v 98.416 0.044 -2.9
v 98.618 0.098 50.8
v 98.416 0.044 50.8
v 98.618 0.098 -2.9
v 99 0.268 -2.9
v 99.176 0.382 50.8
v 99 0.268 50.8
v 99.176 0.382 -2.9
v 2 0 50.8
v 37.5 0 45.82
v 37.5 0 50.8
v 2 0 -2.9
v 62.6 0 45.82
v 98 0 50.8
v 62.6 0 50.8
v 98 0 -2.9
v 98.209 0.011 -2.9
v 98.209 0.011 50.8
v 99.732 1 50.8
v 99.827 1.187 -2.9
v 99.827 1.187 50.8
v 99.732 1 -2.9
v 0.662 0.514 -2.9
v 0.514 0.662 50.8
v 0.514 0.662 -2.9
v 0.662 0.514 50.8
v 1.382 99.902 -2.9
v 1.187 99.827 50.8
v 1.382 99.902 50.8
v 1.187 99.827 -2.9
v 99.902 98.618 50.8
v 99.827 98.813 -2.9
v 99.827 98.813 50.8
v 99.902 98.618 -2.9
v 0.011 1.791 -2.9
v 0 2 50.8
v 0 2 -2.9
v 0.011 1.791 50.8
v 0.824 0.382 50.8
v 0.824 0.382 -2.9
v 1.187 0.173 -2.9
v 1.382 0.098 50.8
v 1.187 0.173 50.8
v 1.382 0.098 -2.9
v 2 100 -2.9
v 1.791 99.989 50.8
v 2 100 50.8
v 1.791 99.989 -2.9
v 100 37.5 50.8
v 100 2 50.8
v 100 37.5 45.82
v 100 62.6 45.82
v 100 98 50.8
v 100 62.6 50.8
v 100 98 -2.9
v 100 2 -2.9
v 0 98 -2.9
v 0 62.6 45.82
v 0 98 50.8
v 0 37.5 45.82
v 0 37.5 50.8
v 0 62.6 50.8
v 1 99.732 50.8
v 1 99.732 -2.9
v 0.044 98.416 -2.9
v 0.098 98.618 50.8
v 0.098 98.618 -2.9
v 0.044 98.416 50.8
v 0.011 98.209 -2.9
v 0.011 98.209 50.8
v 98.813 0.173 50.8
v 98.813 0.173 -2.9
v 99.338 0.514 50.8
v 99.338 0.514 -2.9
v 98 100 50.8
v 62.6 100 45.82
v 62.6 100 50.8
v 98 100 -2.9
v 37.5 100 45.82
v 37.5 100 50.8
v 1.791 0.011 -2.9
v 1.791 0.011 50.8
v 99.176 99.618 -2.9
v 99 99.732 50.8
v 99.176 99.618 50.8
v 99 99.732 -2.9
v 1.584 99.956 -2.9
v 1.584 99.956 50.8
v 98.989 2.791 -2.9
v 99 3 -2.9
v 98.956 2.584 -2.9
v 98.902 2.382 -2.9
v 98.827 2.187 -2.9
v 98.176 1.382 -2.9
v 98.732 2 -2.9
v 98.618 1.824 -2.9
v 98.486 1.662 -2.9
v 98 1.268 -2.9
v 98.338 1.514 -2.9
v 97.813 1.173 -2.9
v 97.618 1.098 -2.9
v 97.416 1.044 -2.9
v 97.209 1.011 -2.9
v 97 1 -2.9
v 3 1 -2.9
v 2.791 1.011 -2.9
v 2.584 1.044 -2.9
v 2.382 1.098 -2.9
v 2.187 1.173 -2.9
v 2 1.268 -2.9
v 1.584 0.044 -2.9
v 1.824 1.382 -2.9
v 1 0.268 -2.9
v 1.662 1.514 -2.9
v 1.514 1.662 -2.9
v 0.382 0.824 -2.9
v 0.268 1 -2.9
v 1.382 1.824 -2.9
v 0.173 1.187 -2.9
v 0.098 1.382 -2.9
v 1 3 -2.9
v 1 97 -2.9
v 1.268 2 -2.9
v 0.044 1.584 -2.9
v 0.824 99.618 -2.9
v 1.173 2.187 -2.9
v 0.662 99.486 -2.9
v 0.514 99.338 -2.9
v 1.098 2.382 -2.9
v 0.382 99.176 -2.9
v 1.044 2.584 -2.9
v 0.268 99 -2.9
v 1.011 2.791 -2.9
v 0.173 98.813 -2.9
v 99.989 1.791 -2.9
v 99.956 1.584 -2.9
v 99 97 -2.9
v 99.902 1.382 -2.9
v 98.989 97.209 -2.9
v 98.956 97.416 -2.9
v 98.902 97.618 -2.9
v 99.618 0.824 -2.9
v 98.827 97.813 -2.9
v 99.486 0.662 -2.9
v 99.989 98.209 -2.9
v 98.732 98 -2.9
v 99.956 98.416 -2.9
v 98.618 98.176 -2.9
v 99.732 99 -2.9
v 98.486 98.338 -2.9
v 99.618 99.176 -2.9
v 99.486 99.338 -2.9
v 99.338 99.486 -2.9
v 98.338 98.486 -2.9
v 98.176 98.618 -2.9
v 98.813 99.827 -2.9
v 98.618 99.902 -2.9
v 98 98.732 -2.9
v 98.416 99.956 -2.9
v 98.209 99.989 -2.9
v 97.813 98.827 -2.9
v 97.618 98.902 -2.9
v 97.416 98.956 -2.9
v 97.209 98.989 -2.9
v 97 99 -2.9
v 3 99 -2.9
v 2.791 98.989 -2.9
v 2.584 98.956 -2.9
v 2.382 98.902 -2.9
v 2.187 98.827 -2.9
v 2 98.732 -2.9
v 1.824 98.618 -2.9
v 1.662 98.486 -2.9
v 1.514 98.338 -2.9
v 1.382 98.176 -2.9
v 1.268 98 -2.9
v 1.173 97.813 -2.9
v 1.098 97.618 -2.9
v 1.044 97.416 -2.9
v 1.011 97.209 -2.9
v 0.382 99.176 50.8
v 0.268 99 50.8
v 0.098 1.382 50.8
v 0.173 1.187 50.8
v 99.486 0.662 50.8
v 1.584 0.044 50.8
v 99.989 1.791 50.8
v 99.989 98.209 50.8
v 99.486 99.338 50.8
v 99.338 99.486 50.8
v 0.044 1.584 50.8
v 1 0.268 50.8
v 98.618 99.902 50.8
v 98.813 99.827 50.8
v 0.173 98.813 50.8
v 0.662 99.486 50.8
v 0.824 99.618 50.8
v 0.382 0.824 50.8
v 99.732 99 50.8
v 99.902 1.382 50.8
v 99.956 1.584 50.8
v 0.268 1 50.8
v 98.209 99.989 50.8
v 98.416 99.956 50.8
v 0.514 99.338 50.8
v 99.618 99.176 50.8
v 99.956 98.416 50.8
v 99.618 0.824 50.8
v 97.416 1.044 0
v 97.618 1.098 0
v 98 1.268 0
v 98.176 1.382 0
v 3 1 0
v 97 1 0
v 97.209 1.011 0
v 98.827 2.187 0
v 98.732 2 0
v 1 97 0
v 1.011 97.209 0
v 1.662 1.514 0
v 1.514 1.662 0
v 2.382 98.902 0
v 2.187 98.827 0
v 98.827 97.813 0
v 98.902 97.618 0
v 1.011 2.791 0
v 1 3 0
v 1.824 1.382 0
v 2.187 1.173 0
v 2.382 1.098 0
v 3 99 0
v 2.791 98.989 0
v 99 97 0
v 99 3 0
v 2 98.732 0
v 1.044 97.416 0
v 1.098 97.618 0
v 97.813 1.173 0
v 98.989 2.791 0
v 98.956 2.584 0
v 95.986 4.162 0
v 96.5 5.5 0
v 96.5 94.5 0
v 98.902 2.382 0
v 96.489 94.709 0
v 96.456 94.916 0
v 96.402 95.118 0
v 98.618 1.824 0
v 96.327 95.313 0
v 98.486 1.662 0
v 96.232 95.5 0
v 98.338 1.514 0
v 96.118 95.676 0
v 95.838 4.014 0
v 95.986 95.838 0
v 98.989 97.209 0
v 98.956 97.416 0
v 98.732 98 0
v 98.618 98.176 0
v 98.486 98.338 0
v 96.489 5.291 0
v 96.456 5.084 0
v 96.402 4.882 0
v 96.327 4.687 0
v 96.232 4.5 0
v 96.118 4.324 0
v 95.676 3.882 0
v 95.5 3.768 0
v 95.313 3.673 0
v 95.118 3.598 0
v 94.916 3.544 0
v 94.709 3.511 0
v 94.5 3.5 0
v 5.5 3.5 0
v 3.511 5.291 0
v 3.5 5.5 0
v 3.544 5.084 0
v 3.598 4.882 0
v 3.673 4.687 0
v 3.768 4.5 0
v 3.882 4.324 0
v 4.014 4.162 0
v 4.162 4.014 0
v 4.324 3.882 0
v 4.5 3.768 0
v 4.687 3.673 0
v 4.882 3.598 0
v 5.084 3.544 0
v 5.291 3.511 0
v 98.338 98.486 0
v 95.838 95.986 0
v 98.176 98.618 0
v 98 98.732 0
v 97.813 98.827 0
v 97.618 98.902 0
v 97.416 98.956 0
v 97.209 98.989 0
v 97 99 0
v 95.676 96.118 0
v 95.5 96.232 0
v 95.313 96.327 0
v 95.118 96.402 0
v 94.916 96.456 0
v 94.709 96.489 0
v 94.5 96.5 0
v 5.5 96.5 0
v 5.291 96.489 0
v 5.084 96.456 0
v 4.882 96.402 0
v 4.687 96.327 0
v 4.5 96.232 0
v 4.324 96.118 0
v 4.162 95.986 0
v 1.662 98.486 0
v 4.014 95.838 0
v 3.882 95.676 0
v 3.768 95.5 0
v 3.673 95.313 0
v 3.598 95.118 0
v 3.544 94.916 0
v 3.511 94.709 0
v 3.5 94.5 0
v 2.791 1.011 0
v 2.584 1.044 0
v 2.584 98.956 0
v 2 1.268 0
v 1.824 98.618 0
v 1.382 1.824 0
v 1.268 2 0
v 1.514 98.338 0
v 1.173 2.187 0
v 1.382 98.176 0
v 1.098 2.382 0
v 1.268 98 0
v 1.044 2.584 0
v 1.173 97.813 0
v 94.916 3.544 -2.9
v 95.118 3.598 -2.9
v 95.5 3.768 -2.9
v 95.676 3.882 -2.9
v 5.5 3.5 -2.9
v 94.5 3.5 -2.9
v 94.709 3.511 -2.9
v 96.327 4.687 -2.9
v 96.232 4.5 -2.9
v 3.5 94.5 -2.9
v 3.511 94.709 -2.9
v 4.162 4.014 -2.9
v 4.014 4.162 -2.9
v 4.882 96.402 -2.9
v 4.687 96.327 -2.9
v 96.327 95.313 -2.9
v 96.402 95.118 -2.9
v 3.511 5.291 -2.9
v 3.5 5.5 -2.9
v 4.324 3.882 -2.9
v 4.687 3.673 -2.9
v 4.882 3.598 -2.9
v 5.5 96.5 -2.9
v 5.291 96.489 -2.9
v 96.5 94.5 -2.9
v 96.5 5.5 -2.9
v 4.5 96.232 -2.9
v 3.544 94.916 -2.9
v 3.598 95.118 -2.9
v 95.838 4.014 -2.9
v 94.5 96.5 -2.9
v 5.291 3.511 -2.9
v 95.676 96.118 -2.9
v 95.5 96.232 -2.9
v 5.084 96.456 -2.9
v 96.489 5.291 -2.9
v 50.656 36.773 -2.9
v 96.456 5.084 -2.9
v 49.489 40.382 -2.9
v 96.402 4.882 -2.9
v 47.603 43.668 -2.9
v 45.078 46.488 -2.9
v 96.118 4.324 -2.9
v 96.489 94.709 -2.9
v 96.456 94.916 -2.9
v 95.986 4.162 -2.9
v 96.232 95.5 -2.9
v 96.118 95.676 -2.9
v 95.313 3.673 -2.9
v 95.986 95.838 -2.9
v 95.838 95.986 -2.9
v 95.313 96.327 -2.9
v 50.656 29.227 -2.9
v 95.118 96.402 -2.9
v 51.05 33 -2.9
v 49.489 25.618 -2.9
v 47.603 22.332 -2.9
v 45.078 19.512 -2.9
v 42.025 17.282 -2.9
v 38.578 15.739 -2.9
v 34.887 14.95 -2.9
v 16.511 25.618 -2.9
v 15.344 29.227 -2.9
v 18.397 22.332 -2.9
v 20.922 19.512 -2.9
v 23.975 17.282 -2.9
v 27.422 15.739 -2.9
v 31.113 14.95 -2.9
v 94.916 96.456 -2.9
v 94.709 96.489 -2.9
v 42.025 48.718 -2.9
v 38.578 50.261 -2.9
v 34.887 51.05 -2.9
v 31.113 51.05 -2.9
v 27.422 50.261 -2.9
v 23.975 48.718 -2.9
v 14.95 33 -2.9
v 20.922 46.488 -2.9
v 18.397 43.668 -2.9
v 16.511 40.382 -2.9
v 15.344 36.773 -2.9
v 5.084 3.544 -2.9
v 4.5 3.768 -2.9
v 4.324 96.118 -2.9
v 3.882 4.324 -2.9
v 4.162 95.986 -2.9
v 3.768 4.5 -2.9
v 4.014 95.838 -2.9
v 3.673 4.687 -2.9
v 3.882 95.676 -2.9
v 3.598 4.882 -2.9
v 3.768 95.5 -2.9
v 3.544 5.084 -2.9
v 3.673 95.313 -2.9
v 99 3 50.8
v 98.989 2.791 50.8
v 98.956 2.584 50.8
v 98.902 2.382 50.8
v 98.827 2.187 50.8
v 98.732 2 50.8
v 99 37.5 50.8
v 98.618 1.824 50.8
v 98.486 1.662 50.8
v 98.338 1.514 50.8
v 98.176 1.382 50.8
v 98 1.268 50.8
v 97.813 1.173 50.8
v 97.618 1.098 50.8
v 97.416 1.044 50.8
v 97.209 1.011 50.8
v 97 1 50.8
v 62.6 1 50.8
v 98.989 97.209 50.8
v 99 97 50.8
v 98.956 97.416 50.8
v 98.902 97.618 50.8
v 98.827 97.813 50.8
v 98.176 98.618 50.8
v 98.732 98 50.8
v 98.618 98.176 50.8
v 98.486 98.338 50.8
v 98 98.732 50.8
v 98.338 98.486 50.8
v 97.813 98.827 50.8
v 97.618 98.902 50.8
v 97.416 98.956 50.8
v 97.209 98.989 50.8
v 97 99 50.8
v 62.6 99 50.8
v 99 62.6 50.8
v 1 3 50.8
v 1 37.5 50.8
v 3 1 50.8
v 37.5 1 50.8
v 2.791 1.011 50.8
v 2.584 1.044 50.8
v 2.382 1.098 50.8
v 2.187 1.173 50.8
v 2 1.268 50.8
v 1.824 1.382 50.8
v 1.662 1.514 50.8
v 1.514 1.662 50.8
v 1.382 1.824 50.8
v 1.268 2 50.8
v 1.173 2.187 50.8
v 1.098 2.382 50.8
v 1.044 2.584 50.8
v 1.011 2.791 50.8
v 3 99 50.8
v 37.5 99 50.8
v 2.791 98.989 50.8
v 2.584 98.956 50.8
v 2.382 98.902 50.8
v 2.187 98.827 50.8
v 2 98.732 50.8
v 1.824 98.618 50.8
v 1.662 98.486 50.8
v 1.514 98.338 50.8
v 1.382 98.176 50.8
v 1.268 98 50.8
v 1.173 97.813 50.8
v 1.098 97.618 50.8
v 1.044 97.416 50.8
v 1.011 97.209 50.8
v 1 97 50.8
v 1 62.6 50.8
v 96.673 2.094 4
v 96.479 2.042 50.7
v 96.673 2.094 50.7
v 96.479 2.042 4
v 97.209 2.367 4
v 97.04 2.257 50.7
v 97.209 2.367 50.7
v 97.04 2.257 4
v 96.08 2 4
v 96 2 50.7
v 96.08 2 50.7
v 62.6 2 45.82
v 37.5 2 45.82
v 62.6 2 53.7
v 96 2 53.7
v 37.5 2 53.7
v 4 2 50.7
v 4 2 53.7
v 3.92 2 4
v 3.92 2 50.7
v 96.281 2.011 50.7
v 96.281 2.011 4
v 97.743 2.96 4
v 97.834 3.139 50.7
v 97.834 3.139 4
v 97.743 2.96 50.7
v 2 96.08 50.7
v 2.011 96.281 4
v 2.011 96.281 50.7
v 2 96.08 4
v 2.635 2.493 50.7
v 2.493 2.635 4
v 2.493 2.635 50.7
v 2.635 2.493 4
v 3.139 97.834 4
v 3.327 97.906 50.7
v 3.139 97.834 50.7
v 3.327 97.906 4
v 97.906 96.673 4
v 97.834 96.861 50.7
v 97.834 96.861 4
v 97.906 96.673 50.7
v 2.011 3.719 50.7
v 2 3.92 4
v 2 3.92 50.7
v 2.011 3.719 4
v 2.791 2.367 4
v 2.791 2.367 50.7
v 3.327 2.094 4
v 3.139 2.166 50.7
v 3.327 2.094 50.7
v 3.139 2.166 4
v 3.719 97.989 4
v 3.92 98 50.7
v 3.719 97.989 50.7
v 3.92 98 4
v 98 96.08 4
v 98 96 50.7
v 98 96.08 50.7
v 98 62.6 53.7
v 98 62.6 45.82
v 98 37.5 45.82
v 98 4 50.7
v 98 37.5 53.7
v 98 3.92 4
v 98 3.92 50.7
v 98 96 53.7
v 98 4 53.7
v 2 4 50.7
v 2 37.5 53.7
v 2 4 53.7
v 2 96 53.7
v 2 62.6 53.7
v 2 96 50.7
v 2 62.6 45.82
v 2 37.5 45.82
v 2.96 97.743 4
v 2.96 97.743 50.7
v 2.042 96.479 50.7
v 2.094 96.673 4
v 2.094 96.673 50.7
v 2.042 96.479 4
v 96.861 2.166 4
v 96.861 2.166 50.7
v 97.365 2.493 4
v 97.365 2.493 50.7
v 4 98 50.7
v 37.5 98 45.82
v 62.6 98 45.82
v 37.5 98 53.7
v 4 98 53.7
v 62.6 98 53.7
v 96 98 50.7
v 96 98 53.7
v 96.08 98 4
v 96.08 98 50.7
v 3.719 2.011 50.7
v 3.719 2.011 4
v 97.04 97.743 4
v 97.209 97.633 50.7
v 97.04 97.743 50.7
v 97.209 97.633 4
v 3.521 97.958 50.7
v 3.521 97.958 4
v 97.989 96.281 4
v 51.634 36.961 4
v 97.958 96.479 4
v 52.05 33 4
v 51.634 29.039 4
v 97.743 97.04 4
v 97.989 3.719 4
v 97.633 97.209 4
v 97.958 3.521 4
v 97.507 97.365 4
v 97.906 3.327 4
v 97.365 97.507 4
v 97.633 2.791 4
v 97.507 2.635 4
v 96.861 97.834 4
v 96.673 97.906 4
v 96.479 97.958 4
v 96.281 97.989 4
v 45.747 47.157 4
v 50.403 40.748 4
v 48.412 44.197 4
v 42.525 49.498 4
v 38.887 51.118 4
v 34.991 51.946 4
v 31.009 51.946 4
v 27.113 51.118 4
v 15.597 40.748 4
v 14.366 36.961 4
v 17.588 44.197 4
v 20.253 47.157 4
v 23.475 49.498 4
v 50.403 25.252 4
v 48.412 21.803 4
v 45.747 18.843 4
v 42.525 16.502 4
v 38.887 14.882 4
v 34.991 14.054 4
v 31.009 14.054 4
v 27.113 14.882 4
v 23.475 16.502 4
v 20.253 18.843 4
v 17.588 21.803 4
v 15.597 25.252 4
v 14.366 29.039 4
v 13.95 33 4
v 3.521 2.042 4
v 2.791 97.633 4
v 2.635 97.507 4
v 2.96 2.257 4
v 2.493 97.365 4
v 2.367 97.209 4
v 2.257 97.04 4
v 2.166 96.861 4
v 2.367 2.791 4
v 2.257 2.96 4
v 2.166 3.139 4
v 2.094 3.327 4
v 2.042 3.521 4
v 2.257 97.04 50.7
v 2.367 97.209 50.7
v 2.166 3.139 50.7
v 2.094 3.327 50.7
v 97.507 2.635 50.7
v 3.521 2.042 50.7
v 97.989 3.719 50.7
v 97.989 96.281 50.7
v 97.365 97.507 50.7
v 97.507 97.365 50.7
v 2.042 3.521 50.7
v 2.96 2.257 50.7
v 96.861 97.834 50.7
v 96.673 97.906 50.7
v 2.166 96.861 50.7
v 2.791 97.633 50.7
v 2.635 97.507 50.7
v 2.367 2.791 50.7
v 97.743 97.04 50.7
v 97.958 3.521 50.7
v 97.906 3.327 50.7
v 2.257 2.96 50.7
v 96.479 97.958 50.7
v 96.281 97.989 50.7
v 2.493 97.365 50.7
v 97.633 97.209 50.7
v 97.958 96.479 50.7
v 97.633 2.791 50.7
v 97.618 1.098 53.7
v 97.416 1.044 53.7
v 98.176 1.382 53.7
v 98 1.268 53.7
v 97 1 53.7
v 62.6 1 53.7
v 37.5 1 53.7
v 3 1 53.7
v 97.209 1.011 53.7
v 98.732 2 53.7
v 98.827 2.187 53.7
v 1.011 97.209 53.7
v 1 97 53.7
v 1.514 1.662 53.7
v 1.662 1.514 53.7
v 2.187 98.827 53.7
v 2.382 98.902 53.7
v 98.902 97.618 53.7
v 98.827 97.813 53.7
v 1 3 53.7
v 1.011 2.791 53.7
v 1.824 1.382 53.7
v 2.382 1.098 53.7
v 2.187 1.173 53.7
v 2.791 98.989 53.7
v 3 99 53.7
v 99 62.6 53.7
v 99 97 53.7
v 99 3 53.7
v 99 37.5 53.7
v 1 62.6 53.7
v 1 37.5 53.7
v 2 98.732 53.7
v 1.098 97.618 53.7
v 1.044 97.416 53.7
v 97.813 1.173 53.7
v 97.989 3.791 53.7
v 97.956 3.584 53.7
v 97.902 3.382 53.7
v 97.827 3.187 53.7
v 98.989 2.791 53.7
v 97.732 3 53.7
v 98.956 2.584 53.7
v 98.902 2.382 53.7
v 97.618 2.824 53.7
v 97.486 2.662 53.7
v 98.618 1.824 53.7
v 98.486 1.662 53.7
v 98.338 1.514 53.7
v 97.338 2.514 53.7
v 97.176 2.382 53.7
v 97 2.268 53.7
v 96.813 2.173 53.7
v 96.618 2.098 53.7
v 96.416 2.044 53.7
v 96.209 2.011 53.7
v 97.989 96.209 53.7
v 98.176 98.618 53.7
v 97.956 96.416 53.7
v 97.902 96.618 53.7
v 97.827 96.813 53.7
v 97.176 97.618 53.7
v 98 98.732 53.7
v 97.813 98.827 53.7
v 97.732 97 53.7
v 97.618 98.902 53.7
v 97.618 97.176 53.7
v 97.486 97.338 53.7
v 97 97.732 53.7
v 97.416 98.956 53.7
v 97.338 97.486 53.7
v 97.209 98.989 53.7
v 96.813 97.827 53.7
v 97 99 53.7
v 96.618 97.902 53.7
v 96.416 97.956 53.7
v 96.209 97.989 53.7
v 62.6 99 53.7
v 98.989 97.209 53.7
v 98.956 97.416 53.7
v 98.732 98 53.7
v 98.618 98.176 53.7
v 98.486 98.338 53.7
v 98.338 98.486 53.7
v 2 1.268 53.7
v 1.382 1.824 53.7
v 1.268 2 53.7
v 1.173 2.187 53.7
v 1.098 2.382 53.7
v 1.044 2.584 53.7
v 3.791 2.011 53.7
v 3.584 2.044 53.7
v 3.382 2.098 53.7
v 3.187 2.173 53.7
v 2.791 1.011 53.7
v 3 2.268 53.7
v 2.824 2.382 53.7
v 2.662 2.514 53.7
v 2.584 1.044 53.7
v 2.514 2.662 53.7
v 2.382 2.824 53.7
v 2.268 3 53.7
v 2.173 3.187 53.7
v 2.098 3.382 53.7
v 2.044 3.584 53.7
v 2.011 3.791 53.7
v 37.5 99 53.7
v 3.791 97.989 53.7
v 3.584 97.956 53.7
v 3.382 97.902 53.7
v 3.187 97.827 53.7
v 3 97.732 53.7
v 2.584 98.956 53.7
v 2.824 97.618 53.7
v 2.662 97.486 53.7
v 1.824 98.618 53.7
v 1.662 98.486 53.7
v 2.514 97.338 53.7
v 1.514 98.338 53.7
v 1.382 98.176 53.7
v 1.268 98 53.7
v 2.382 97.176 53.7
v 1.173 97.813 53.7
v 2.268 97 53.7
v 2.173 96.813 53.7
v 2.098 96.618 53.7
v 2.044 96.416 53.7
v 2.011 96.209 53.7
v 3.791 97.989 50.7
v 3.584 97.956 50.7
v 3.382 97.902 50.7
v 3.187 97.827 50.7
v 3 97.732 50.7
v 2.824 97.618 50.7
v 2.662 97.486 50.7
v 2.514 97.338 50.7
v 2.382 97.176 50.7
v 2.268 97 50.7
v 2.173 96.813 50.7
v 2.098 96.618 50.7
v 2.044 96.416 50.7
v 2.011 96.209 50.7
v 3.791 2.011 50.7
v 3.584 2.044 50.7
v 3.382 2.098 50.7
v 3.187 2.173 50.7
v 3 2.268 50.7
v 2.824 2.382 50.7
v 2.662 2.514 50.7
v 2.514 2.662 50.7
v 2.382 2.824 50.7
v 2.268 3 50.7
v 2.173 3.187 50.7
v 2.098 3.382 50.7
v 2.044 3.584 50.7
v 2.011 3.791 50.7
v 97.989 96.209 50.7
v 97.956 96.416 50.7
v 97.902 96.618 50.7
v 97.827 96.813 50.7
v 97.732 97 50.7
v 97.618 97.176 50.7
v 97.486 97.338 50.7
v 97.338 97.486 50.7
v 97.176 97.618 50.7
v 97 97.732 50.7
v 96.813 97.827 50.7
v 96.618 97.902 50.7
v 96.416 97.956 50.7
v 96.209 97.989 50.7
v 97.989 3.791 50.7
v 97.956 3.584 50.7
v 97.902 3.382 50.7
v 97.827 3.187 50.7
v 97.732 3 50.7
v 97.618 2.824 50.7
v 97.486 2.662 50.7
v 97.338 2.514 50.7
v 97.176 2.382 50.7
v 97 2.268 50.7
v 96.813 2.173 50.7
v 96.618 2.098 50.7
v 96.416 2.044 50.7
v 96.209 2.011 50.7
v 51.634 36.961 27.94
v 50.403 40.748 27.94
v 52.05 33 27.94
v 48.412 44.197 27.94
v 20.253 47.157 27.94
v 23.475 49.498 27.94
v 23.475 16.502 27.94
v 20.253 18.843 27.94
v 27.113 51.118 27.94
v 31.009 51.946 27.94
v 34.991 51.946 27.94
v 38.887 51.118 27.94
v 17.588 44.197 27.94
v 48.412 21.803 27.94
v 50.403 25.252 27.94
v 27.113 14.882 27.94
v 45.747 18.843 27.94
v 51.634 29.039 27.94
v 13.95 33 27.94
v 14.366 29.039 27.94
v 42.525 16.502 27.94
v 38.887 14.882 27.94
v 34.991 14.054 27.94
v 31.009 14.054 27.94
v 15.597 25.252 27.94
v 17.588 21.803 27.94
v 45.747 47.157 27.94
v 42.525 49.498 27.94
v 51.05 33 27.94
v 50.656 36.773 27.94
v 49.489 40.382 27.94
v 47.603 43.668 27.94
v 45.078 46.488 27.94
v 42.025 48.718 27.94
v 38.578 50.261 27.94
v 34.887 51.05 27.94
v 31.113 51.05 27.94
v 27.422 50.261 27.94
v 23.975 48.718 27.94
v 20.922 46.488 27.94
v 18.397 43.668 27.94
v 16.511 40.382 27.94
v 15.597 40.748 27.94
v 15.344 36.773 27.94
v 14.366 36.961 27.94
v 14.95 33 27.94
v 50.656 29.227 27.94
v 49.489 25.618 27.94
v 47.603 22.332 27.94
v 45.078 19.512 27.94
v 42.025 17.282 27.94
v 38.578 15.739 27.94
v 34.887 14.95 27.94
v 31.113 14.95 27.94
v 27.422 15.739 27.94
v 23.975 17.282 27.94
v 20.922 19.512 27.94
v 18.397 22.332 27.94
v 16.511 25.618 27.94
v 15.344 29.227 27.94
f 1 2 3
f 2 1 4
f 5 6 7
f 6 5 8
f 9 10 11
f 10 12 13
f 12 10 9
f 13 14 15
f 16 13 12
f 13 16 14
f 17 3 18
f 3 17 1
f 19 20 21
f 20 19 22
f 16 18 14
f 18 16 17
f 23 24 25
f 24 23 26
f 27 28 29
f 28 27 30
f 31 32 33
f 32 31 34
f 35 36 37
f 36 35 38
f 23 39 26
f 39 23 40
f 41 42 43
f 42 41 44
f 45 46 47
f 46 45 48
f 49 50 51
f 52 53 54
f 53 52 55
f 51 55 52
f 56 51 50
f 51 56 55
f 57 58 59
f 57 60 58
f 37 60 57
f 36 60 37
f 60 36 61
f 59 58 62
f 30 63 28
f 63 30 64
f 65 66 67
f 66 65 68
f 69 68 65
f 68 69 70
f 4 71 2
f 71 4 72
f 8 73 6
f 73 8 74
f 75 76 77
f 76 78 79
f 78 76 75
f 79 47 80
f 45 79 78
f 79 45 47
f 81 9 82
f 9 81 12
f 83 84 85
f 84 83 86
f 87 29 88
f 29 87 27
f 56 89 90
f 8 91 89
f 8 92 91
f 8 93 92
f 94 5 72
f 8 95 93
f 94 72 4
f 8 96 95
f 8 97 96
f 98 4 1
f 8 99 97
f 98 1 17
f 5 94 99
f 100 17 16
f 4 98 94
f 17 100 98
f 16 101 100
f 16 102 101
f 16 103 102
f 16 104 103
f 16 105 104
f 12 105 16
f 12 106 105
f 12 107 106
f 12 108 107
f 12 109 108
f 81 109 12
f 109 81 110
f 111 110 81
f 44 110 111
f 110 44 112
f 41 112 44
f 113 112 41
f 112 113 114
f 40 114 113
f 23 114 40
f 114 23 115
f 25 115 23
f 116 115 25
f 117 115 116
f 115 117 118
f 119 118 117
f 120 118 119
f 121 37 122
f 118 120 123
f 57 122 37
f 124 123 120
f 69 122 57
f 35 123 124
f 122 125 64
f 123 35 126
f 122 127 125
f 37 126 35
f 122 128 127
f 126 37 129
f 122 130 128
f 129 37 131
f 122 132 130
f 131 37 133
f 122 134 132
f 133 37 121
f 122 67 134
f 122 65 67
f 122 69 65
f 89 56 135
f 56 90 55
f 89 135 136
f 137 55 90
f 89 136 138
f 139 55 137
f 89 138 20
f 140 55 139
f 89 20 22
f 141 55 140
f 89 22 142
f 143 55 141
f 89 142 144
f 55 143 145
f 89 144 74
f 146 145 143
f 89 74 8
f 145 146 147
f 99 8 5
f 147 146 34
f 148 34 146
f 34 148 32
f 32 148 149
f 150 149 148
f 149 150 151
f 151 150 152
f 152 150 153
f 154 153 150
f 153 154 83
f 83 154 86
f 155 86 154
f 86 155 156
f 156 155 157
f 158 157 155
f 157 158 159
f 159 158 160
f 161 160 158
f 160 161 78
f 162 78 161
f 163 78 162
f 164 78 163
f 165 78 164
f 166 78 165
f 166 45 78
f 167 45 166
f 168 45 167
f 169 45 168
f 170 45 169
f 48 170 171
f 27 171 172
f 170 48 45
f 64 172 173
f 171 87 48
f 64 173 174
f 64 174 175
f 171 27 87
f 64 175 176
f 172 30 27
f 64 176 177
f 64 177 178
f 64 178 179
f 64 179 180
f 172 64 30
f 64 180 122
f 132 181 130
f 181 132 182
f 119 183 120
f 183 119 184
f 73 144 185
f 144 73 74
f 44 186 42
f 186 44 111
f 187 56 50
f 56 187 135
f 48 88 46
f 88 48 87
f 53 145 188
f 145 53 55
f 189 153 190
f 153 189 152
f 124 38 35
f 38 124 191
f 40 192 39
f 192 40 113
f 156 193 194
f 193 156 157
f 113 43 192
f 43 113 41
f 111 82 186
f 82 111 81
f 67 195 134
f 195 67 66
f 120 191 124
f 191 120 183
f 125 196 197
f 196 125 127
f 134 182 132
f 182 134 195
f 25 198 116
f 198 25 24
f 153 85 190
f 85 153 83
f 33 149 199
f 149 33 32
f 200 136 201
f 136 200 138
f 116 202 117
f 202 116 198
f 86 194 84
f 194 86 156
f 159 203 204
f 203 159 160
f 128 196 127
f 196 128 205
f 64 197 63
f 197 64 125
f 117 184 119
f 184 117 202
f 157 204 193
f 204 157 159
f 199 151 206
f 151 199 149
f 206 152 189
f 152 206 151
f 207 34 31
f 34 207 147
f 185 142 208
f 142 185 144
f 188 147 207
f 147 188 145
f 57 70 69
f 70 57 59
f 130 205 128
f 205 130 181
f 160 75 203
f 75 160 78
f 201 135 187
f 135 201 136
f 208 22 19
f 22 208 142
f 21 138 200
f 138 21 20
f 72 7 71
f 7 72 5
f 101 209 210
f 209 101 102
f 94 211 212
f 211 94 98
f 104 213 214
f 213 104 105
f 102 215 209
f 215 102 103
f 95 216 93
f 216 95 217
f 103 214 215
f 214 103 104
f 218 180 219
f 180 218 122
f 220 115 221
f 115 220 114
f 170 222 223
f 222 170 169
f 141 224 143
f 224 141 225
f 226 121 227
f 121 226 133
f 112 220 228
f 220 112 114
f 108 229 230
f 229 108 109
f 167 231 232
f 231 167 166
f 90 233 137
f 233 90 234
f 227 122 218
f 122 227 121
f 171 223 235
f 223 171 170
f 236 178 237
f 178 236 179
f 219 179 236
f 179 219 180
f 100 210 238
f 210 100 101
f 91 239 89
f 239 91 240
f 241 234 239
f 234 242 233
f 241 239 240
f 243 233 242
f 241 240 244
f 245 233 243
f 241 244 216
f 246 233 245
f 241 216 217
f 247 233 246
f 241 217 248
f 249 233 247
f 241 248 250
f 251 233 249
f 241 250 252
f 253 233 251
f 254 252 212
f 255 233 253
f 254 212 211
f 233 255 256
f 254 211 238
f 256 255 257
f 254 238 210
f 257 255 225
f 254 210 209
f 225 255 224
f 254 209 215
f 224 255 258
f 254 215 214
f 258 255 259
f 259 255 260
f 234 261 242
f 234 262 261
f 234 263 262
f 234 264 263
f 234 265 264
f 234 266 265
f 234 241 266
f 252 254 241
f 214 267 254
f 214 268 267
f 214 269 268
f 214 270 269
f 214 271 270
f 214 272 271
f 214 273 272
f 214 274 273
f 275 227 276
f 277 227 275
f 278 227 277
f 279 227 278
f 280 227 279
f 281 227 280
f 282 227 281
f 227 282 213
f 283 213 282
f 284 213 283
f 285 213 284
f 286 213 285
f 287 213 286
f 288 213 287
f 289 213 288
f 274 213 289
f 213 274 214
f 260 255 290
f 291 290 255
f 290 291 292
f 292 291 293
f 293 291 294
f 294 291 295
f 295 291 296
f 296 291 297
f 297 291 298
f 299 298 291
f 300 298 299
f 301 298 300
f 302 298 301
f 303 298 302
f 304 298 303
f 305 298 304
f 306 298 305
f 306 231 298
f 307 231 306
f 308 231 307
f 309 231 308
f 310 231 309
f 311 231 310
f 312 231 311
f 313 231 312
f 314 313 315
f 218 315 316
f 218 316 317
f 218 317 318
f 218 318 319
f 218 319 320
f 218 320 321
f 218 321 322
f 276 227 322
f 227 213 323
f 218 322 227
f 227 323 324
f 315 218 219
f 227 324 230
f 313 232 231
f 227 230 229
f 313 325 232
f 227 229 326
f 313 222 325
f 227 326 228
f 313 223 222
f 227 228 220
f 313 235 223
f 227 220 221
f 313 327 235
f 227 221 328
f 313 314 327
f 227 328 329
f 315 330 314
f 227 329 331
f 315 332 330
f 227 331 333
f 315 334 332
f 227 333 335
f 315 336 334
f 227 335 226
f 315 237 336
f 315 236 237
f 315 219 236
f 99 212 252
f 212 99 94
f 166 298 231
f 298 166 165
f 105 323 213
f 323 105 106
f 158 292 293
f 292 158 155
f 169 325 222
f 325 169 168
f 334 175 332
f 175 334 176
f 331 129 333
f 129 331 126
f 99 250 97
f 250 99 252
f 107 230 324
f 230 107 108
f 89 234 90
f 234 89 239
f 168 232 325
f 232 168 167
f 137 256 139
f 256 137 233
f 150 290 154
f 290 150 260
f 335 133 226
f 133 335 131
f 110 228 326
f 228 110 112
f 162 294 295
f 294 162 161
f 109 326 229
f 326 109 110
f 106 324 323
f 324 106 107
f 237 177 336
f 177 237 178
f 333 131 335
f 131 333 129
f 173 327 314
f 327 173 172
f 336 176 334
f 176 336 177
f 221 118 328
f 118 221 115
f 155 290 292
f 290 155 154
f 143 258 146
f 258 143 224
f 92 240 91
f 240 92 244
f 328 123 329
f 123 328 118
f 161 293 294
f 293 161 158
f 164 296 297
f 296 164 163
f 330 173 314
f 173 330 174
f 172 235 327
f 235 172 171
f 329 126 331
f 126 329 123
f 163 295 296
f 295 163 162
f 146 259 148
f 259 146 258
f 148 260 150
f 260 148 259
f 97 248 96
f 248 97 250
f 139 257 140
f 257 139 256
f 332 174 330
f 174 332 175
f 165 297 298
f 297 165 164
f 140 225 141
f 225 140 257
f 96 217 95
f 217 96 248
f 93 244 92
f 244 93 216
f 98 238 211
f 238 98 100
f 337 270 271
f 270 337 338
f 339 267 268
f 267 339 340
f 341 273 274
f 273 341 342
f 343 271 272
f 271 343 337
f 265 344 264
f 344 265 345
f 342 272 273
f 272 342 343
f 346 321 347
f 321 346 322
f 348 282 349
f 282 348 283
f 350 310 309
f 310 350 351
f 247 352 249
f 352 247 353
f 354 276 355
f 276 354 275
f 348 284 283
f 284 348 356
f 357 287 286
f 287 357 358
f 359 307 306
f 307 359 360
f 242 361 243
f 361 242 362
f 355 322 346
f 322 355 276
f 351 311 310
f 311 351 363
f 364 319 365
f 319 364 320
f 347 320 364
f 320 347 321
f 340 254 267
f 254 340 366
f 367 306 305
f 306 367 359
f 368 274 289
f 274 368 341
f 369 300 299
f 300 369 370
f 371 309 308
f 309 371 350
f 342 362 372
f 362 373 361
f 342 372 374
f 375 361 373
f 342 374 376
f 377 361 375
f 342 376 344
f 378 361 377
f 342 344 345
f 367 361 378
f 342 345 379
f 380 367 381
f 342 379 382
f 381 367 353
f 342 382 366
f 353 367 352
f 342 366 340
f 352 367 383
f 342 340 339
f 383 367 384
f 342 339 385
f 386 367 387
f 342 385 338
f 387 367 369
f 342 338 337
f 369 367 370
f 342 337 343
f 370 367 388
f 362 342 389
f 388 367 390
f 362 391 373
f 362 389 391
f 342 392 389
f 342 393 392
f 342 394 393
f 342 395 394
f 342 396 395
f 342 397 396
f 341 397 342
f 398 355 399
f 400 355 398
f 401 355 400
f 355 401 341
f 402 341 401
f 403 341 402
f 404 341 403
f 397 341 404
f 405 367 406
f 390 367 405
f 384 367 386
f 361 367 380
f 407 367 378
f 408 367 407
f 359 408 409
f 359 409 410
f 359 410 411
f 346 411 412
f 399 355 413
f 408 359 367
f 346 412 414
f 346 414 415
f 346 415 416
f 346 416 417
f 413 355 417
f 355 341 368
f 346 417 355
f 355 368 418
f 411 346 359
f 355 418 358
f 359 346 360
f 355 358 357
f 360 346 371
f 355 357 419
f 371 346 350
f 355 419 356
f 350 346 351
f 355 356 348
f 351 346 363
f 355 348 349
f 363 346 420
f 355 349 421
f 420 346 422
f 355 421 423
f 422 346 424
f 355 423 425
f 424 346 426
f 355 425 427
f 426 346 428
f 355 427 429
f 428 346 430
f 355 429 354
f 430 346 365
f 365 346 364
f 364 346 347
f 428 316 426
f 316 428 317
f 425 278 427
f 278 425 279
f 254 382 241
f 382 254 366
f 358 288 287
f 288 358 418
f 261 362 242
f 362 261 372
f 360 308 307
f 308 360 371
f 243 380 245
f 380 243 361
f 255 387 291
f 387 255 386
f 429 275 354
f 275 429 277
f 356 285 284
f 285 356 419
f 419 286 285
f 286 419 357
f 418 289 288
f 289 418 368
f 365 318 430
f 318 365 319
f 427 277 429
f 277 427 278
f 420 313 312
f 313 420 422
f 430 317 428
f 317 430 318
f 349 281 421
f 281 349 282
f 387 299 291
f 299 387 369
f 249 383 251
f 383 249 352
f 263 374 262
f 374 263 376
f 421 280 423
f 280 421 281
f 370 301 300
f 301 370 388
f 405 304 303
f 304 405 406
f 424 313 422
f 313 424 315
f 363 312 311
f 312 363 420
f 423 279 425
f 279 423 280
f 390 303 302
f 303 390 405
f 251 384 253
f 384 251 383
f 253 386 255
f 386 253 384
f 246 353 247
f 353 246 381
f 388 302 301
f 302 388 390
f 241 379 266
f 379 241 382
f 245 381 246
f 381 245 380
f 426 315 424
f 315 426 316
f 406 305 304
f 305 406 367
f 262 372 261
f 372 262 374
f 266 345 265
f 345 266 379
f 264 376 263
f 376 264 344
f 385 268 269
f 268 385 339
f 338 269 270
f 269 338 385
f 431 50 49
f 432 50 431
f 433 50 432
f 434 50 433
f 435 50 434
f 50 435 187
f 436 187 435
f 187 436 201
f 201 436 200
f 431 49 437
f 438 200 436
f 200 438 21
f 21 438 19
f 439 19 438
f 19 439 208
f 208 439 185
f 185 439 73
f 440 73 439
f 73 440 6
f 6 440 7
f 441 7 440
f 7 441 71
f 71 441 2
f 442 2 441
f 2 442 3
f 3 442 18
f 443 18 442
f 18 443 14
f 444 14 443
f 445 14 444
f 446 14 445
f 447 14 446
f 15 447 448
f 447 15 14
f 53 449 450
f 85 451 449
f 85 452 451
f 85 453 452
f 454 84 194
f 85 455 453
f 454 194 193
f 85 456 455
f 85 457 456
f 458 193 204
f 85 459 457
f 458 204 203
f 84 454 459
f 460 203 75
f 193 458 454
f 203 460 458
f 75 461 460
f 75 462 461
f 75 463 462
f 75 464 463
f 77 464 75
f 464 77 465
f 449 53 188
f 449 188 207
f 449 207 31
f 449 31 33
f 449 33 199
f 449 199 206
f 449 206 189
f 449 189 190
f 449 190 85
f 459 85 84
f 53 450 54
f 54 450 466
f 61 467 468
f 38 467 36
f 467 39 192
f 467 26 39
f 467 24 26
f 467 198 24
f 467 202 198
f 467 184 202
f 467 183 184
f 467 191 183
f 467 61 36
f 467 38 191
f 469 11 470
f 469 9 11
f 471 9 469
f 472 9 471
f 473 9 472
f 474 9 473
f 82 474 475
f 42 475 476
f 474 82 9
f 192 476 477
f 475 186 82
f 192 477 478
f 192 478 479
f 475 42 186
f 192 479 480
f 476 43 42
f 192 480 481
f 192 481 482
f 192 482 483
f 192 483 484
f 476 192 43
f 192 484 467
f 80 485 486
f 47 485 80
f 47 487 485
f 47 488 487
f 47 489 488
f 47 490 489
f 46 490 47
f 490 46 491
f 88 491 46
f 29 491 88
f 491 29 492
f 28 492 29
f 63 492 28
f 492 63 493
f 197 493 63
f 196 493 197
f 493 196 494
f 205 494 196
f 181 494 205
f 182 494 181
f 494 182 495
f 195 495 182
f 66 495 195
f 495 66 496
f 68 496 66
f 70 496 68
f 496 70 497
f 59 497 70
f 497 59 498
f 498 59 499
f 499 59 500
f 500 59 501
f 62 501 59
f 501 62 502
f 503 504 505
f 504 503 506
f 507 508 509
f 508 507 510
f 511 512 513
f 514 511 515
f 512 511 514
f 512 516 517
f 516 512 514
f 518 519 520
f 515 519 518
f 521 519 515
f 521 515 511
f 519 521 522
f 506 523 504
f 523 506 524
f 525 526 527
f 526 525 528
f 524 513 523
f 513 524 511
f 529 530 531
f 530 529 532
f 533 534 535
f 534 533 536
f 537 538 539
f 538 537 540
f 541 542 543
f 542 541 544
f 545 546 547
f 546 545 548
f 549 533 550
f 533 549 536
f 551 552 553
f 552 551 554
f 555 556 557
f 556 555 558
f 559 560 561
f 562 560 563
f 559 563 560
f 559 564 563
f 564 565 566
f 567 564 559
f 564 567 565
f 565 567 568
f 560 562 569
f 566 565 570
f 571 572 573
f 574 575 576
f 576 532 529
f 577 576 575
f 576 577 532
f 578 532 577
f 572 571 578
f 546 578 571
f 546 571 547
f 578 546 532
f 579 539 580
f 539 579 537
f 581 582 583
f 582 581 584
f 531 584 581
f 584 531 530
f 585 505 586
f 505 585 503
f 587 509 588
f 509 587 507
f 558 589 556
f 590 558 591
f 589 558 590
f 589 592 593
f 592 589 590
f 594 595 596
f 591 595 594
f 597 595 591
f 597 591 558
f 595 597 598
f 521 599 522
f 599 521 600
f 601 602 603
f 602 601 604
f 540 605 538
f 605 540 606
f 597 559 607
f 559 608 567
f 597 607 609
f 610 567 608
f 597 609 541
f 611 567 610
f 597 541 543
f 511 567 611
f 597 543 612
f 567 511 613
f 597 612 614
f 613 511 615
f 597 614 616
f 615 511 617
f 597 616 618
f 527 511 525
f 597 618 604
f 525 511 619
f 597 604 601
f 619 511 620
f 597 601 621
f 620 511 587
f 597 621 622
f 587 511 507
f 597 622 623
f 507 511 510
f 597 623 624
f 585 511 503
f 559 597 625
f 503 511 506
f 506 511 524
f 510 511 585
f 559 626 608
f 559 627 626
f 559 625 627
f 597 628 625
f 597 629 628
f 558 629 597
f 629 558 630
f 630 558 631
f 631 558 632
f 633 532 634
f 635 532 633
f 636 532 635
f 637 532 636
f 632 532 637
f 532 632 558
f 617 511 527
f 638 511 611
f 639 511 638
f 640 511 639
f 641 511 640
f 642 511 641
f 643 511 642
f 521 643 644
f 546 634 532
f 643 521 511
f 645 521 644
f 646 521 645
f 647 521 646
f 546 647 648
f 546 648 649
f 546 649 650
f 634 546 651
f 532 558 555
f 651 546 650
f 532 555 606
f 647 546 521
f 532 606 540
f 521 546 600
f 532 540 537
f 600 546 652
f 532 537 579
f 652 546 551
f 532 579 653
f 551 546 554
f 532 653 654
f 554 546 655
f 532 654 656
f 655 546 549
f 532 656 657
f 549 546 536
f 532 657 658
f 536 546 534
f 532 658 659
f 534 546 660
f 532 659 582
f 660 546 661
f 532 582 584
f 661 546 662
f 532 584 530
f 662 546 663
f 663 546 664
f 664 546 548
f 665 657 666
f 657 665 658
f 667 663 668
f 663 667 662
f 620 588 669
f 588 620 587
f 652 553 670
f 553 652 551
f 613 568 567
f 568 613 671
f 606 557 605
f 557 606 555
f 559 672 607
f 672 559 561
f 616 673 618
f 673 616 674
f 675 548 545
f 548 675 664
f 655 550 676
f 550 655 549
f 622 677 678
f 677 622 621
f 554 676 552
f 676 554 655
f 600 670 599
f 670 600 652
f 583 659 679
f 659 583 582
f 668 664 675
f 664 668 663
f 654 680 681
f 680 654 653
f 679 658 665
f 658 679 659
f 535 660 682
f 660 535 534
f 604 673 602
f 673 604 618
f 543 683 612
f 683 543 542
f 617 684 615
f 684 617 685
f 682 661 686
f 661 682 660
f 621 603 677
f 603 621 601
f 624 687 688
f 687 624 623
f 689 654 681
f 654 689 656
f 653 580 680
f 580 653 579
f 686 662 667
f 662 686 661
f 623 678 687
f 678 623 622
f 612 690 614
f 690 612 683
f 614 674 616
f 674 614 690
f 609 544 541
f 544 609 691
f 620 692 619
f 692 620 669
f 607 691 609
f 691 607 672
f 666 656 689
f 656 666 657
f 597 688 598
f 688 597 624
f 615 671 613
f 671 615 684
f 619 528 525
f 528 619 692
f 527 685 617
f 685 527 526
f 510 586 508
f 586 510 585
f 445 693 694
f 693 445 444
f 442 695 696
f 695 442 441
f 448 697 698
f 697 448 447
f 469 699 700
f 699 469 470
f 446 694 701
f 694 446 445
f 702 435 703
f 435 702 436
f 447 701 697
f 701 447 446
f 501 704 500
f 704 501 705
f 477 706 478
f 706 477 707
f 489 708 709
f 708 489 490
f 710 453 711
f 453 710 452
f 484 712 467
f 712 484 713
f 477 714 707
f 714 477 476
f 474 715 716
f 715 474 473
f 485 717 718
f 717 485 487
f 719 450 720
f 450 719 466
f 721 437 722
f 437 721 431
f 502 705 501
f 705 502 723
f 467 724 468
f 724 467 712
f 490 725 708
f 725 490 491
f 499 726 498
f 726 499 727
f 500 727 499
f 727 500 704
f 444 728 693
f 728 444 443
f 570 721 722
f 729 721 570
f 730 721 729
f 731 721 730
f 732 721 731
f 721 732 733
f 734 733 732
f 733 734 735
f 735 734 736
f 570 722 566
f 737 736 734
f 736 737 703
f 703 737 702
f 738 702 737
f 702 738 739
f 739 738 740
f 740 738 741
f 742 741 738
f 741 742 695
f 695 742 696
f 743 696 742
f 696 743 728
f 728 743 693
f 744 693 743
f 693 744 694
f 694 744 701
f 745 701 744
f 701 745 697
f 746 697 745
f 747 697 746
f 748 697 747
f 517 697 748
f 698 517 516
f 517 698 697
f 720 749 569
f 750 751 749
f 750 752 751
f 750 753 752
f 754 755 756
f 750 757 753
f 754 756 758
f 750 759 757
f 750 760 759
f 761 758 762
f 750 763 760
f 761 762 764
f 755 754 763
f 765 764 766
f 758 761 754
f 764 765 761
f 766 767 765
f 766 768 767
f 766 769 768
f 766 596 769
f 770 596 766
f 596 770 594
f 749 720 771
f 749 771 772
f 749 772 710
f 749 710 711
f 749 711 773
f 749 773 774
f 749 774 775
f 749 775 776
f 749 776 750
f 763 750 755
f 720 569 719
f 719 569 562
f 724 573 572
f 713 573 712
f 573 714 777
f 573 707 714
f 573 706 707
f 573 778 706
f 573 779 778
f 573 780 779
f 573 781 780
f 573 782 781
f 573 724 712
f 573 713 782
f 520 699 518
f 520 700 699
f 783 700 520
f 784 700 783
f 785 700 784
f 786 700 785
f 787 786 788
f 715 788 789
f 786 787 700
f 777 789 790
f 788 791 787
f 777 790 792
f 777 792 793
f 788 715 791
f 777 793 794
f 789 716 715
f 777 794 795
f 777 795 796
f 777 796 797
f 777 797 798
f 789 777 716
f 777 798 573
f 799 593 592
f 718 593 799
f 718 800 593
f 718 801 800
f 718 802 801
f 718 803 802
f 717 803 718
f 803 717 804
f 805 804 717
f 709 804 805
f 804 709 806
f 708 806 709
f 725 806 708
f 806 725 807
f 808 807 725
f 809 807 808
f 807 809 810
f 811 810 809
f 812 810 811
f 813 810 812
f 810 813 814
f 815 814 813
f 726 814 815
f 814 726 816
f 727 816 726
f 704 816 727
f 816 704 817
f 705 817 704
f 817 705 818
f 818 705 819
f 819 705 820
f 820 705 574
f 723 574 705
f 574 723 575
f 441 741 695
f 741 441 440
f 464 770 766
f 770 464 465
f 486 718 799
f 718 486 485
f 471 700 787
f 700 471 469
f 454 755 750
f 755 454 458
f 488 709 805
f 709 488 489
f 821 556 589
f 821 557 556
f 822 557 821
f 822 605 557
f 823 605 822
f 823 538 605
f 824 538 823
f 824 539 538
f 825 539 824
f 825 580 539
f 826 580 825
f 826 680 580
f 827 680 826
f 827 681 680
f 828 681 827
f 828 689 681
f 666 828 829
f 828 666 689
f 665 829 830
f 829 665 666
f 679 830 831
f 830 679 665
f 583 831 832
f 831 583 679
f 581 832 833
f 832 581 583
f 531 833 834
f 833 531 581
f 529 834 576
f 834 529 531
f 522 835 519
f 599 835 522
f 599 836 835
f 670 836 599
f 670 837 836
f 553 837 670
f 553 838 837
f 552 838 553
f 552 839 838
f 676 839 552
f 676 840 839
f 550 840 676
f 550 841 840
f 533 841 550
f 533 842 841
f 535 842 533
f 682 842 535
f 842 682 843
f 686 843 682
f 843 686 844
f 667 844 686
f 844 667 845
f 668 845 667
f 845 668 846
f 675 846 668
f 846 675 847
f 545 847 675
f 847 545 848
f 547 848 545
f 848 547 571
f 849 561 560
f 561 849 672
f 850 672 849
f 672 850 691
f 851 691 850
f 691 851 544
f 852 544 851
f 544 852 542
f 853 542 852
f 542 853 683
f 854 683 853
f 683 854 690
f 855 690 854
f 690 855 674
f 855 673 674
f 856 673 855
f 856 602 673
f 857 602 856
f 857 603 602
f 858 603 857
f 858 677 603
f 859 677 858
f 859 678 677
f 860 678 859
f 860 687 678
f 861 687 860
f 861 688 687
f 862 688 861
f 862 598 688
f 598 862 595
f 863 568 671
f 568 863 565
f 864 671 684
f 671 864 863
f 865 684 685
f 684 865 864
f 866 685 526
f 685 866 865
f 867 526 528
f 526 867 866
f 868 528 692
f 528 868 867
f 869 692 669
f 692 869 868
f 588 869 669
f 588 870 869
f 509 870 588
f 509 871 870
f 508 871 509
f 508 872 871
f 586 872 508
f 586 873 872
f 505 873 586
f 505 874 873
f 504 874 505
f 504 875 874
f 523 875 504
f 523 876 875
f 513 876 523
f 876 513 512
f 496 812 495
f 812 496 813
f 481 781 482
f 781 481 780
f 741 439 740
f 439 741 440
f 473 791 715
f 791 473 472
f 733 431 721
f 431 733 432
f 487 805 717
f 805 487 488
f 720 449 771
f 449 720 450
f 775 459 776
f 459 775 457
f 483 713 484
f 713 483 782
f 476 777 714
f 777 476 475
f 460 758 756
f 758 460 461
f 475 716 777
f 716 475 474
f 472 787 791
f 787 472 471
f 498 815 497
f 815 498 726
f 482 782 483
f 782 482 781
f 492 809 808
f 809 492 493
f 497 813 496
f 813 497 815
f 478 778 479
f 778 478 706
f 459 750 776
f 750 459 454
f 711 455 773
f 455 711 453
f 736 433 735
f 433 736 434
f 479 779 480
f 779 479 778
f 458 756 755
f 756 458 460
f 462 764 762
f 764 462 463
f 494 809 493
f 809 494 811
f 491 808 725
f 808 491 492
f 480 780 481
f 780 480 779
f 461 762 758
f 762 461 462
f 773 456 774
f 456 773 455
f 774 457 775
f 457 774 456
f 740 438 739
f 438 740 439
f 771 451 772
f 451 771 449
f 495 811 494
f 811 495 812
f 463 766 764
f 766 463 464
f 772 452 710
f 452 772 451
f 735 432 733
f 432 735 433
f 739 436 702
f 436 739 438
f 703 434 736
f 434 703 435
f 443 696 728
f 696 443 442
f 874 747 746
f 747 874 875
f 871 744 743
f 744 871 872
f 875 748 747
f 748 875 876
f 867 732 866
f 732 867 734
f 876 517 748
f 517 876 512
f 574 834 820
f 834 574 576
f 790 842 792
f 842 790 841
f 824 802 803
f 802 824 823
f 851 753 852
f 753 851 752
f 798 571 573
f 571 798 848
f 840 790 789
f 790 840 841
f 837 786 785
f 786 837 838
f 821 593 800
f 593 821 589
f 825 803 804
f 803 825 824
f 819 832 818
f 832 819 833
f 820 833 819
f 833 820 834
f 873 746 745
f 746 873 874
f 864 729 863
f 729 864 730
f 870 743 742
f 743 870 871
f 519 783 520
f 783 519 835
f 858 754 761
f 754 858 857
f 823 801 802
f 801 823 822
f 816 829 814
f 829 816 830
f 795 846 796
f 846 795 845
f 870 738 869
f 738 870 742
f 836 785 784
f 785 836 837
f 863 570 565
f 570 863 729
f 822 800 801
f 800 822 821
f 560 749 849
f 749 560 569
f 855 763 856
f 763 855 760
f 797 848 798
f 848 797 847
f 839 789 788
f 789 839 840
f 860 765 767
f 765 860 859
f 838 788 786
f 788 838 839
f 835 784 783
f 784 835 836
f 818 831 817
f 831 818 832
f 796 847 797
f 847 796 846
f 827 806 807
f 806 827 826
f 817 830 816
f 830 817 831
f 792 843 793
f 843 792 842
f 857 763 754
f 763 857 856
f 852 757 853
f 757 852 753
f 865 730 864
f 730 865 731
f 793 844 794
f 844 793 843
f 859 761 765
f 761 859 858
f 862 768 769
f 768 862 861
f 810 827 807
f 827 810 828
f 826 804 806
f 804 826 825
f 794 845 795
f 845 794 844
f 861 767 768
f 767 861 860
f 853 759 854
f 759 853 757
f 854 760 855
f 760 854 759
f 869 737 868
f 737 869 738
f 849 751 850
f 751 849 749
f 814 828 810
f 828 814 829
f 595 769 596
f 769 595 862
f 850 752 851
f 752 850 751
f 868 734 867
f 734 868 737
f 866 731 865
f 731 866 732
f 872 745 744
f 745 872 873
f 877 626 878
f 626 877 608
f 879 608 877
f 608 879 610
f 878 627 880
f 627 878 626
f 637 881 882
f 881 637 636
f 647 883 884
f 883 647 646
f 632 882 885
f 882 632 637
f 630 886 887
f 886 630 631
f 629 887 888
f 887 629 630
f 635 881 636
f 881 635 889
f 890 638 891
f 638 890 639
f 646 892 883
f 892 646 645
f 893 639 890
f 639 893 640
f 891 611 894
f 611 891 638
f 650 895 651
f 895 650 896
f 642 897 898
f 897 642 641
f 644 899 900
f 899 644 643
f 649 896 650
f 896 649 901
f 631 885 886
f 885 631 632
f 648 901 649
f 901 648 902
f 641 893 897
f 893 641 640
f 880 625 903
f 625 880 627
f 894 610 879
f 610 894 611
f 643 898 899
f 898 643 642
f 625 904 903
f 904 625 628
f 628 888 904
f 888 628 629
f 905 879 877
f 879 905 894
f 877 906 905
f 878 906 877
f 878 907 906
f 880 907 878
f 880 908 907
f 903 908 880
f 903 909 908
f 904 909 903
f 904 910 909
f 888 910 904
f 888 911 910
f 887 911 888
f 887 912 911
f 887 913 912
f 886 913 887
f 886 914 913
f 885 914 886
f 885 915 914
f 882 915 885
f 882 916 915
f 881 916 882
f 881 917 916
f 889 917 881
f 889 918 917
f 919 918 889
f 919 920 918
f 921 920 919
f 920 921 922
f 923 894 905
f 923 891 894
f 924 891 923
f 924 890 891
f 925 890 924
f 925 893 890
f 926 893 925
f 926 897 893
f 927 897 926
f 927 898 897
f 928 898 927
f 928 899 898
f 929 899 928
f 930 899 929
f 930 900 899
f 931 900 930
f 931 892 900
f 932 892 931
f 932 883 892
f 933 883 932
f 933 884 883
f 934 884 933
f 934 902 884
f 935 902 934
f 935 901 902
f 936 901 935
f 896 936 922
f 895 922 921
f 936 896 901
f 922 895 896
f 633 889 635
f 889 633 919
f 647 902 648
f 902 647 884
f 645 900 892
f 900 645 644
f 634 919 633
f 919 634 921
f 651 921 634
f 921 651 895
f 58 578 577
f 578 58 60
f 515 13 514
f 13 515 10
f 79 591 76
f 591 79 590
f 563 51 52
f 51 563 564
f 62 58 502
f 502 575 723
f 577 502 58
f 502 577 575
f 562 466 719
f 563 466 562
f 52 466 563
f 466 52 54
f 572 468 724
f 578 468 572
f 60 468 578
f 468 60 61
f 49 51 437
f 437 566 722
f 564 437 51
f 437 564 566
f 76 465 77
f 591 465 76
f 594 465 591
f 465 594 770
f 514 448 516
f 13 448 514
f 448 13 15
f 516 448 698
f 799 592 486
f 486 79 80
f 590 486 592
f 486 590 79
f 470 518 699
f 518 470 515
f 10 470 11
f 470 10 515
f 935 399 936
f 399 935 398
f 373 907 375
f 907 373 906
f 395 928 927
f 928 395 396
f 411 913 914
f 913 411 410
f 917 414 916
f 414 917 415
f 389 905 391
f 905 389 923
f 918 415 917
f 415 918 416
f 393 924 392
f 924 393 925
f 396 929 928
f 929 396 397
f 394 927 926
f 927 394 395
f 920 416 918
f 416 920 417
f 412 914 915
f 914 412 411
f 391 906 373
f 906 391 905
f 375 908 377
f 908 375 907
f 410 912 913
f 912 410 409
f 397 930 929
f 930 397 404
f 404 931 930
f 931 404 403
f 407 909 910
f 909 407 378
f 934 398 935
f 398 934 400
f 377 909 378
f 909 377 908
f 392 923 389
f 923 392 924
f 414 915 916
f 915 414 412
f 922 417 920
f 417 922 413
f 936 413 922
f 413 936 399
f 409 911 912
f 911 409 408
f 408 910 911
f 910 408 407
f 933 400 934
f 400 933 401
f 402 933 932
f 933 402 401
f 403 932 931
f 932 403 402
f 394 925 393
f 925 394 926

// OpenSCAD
outside_width = 100;
wall_thickness = 1;
outside_height=2*25.4;
drain_height=1.1*25.4;
drain_diameter=1.5*25.4;
inside_scale = (outside_width-wall_thickness*4)/outside_width;

margin=0.1;

difference() {
    union(){
        //drain exterior
        translate([outside_width*.33, outside_width*.33])
        cylinder(drain_height, r=drain_diameter/2);
        
        //base
        union() {
            difference() {
                //outer base
                translate([0,0,-3+margin]) rounded_rect(outside_width, outside_width, 3, 2);
                //channel for fitting lower piece underneath
                translate([wall_thickness,wall_thickness,-3]) rounded_rect(outside_width-wall_thickness*2, outside_width-wall_thickness*2, 3, 2);
            }
            //inner base
            translate([wall_thickness*3.5,wall_thickness*3.5,-3+margin]) rounded_rect(outside_width-wall_thickness*7, outside_width-wall_thickness*7, 3, 2);
        }
        

        difference() { //holding box
        rounded_rect(outside_width, outside_width, outside_height, 2);
        translate([wall_thickness*2, wall_thickness*2, wall_thickness*4]) 
            scale([inside_scale, inside_scale, inside_scale]) 
                rounded_rect(outside_width, outside_width, outside_height, 2);
        }
        
        //top rim
        difference() {
            translate([wall_thickness,wall_thickness,outside_height-margin])
                rounded_rect(outside_width-wall_thickness*2, outside_width-wall_thickness*2, 3, 2);
            //rim for fitting upper piece above
            translate([wall_thickness*2,wall_thickness*2,outside_height-margin*1.1])
                rounded_rect(outside_width-wall_thickness*4, outside_width-wall_thickness*4, 3+margin*2, 2);
        }
    }
    //drain hollow
    translate([outside_width*.33, outside_width*.33, -3-margin])
    resize([drain_diameter-wall_thickness*2, drain_diameter-wall_thickness*2, drain_height+3+margin*2])
    cylinder(drain_height+3, r=drain_diameter/2);
    
    //overflow cutouts
    union() {
        translate([0-0.5*margin, 0.75*outside_width/2, outside_height*0.9+margin])
            cube([1*outside_width+margin, 0.25*outside_width+margin, outside_height*.1+3]);
        translate([0.75*outside_width/2, 0-0.5*margin, outside_height*0.9+margin])
            cube([0.25*outside_width+margin, 1*outside_width+margin, outside_height*.1+3]);
    }
}
module rounded_rect(l, w, h, r)
{
    linear_extrude(h)
    translate([r, r, 0])
    offset(r=r, $fn = 60) 
    square([l-(2*r), w-(2*r)]);
}
